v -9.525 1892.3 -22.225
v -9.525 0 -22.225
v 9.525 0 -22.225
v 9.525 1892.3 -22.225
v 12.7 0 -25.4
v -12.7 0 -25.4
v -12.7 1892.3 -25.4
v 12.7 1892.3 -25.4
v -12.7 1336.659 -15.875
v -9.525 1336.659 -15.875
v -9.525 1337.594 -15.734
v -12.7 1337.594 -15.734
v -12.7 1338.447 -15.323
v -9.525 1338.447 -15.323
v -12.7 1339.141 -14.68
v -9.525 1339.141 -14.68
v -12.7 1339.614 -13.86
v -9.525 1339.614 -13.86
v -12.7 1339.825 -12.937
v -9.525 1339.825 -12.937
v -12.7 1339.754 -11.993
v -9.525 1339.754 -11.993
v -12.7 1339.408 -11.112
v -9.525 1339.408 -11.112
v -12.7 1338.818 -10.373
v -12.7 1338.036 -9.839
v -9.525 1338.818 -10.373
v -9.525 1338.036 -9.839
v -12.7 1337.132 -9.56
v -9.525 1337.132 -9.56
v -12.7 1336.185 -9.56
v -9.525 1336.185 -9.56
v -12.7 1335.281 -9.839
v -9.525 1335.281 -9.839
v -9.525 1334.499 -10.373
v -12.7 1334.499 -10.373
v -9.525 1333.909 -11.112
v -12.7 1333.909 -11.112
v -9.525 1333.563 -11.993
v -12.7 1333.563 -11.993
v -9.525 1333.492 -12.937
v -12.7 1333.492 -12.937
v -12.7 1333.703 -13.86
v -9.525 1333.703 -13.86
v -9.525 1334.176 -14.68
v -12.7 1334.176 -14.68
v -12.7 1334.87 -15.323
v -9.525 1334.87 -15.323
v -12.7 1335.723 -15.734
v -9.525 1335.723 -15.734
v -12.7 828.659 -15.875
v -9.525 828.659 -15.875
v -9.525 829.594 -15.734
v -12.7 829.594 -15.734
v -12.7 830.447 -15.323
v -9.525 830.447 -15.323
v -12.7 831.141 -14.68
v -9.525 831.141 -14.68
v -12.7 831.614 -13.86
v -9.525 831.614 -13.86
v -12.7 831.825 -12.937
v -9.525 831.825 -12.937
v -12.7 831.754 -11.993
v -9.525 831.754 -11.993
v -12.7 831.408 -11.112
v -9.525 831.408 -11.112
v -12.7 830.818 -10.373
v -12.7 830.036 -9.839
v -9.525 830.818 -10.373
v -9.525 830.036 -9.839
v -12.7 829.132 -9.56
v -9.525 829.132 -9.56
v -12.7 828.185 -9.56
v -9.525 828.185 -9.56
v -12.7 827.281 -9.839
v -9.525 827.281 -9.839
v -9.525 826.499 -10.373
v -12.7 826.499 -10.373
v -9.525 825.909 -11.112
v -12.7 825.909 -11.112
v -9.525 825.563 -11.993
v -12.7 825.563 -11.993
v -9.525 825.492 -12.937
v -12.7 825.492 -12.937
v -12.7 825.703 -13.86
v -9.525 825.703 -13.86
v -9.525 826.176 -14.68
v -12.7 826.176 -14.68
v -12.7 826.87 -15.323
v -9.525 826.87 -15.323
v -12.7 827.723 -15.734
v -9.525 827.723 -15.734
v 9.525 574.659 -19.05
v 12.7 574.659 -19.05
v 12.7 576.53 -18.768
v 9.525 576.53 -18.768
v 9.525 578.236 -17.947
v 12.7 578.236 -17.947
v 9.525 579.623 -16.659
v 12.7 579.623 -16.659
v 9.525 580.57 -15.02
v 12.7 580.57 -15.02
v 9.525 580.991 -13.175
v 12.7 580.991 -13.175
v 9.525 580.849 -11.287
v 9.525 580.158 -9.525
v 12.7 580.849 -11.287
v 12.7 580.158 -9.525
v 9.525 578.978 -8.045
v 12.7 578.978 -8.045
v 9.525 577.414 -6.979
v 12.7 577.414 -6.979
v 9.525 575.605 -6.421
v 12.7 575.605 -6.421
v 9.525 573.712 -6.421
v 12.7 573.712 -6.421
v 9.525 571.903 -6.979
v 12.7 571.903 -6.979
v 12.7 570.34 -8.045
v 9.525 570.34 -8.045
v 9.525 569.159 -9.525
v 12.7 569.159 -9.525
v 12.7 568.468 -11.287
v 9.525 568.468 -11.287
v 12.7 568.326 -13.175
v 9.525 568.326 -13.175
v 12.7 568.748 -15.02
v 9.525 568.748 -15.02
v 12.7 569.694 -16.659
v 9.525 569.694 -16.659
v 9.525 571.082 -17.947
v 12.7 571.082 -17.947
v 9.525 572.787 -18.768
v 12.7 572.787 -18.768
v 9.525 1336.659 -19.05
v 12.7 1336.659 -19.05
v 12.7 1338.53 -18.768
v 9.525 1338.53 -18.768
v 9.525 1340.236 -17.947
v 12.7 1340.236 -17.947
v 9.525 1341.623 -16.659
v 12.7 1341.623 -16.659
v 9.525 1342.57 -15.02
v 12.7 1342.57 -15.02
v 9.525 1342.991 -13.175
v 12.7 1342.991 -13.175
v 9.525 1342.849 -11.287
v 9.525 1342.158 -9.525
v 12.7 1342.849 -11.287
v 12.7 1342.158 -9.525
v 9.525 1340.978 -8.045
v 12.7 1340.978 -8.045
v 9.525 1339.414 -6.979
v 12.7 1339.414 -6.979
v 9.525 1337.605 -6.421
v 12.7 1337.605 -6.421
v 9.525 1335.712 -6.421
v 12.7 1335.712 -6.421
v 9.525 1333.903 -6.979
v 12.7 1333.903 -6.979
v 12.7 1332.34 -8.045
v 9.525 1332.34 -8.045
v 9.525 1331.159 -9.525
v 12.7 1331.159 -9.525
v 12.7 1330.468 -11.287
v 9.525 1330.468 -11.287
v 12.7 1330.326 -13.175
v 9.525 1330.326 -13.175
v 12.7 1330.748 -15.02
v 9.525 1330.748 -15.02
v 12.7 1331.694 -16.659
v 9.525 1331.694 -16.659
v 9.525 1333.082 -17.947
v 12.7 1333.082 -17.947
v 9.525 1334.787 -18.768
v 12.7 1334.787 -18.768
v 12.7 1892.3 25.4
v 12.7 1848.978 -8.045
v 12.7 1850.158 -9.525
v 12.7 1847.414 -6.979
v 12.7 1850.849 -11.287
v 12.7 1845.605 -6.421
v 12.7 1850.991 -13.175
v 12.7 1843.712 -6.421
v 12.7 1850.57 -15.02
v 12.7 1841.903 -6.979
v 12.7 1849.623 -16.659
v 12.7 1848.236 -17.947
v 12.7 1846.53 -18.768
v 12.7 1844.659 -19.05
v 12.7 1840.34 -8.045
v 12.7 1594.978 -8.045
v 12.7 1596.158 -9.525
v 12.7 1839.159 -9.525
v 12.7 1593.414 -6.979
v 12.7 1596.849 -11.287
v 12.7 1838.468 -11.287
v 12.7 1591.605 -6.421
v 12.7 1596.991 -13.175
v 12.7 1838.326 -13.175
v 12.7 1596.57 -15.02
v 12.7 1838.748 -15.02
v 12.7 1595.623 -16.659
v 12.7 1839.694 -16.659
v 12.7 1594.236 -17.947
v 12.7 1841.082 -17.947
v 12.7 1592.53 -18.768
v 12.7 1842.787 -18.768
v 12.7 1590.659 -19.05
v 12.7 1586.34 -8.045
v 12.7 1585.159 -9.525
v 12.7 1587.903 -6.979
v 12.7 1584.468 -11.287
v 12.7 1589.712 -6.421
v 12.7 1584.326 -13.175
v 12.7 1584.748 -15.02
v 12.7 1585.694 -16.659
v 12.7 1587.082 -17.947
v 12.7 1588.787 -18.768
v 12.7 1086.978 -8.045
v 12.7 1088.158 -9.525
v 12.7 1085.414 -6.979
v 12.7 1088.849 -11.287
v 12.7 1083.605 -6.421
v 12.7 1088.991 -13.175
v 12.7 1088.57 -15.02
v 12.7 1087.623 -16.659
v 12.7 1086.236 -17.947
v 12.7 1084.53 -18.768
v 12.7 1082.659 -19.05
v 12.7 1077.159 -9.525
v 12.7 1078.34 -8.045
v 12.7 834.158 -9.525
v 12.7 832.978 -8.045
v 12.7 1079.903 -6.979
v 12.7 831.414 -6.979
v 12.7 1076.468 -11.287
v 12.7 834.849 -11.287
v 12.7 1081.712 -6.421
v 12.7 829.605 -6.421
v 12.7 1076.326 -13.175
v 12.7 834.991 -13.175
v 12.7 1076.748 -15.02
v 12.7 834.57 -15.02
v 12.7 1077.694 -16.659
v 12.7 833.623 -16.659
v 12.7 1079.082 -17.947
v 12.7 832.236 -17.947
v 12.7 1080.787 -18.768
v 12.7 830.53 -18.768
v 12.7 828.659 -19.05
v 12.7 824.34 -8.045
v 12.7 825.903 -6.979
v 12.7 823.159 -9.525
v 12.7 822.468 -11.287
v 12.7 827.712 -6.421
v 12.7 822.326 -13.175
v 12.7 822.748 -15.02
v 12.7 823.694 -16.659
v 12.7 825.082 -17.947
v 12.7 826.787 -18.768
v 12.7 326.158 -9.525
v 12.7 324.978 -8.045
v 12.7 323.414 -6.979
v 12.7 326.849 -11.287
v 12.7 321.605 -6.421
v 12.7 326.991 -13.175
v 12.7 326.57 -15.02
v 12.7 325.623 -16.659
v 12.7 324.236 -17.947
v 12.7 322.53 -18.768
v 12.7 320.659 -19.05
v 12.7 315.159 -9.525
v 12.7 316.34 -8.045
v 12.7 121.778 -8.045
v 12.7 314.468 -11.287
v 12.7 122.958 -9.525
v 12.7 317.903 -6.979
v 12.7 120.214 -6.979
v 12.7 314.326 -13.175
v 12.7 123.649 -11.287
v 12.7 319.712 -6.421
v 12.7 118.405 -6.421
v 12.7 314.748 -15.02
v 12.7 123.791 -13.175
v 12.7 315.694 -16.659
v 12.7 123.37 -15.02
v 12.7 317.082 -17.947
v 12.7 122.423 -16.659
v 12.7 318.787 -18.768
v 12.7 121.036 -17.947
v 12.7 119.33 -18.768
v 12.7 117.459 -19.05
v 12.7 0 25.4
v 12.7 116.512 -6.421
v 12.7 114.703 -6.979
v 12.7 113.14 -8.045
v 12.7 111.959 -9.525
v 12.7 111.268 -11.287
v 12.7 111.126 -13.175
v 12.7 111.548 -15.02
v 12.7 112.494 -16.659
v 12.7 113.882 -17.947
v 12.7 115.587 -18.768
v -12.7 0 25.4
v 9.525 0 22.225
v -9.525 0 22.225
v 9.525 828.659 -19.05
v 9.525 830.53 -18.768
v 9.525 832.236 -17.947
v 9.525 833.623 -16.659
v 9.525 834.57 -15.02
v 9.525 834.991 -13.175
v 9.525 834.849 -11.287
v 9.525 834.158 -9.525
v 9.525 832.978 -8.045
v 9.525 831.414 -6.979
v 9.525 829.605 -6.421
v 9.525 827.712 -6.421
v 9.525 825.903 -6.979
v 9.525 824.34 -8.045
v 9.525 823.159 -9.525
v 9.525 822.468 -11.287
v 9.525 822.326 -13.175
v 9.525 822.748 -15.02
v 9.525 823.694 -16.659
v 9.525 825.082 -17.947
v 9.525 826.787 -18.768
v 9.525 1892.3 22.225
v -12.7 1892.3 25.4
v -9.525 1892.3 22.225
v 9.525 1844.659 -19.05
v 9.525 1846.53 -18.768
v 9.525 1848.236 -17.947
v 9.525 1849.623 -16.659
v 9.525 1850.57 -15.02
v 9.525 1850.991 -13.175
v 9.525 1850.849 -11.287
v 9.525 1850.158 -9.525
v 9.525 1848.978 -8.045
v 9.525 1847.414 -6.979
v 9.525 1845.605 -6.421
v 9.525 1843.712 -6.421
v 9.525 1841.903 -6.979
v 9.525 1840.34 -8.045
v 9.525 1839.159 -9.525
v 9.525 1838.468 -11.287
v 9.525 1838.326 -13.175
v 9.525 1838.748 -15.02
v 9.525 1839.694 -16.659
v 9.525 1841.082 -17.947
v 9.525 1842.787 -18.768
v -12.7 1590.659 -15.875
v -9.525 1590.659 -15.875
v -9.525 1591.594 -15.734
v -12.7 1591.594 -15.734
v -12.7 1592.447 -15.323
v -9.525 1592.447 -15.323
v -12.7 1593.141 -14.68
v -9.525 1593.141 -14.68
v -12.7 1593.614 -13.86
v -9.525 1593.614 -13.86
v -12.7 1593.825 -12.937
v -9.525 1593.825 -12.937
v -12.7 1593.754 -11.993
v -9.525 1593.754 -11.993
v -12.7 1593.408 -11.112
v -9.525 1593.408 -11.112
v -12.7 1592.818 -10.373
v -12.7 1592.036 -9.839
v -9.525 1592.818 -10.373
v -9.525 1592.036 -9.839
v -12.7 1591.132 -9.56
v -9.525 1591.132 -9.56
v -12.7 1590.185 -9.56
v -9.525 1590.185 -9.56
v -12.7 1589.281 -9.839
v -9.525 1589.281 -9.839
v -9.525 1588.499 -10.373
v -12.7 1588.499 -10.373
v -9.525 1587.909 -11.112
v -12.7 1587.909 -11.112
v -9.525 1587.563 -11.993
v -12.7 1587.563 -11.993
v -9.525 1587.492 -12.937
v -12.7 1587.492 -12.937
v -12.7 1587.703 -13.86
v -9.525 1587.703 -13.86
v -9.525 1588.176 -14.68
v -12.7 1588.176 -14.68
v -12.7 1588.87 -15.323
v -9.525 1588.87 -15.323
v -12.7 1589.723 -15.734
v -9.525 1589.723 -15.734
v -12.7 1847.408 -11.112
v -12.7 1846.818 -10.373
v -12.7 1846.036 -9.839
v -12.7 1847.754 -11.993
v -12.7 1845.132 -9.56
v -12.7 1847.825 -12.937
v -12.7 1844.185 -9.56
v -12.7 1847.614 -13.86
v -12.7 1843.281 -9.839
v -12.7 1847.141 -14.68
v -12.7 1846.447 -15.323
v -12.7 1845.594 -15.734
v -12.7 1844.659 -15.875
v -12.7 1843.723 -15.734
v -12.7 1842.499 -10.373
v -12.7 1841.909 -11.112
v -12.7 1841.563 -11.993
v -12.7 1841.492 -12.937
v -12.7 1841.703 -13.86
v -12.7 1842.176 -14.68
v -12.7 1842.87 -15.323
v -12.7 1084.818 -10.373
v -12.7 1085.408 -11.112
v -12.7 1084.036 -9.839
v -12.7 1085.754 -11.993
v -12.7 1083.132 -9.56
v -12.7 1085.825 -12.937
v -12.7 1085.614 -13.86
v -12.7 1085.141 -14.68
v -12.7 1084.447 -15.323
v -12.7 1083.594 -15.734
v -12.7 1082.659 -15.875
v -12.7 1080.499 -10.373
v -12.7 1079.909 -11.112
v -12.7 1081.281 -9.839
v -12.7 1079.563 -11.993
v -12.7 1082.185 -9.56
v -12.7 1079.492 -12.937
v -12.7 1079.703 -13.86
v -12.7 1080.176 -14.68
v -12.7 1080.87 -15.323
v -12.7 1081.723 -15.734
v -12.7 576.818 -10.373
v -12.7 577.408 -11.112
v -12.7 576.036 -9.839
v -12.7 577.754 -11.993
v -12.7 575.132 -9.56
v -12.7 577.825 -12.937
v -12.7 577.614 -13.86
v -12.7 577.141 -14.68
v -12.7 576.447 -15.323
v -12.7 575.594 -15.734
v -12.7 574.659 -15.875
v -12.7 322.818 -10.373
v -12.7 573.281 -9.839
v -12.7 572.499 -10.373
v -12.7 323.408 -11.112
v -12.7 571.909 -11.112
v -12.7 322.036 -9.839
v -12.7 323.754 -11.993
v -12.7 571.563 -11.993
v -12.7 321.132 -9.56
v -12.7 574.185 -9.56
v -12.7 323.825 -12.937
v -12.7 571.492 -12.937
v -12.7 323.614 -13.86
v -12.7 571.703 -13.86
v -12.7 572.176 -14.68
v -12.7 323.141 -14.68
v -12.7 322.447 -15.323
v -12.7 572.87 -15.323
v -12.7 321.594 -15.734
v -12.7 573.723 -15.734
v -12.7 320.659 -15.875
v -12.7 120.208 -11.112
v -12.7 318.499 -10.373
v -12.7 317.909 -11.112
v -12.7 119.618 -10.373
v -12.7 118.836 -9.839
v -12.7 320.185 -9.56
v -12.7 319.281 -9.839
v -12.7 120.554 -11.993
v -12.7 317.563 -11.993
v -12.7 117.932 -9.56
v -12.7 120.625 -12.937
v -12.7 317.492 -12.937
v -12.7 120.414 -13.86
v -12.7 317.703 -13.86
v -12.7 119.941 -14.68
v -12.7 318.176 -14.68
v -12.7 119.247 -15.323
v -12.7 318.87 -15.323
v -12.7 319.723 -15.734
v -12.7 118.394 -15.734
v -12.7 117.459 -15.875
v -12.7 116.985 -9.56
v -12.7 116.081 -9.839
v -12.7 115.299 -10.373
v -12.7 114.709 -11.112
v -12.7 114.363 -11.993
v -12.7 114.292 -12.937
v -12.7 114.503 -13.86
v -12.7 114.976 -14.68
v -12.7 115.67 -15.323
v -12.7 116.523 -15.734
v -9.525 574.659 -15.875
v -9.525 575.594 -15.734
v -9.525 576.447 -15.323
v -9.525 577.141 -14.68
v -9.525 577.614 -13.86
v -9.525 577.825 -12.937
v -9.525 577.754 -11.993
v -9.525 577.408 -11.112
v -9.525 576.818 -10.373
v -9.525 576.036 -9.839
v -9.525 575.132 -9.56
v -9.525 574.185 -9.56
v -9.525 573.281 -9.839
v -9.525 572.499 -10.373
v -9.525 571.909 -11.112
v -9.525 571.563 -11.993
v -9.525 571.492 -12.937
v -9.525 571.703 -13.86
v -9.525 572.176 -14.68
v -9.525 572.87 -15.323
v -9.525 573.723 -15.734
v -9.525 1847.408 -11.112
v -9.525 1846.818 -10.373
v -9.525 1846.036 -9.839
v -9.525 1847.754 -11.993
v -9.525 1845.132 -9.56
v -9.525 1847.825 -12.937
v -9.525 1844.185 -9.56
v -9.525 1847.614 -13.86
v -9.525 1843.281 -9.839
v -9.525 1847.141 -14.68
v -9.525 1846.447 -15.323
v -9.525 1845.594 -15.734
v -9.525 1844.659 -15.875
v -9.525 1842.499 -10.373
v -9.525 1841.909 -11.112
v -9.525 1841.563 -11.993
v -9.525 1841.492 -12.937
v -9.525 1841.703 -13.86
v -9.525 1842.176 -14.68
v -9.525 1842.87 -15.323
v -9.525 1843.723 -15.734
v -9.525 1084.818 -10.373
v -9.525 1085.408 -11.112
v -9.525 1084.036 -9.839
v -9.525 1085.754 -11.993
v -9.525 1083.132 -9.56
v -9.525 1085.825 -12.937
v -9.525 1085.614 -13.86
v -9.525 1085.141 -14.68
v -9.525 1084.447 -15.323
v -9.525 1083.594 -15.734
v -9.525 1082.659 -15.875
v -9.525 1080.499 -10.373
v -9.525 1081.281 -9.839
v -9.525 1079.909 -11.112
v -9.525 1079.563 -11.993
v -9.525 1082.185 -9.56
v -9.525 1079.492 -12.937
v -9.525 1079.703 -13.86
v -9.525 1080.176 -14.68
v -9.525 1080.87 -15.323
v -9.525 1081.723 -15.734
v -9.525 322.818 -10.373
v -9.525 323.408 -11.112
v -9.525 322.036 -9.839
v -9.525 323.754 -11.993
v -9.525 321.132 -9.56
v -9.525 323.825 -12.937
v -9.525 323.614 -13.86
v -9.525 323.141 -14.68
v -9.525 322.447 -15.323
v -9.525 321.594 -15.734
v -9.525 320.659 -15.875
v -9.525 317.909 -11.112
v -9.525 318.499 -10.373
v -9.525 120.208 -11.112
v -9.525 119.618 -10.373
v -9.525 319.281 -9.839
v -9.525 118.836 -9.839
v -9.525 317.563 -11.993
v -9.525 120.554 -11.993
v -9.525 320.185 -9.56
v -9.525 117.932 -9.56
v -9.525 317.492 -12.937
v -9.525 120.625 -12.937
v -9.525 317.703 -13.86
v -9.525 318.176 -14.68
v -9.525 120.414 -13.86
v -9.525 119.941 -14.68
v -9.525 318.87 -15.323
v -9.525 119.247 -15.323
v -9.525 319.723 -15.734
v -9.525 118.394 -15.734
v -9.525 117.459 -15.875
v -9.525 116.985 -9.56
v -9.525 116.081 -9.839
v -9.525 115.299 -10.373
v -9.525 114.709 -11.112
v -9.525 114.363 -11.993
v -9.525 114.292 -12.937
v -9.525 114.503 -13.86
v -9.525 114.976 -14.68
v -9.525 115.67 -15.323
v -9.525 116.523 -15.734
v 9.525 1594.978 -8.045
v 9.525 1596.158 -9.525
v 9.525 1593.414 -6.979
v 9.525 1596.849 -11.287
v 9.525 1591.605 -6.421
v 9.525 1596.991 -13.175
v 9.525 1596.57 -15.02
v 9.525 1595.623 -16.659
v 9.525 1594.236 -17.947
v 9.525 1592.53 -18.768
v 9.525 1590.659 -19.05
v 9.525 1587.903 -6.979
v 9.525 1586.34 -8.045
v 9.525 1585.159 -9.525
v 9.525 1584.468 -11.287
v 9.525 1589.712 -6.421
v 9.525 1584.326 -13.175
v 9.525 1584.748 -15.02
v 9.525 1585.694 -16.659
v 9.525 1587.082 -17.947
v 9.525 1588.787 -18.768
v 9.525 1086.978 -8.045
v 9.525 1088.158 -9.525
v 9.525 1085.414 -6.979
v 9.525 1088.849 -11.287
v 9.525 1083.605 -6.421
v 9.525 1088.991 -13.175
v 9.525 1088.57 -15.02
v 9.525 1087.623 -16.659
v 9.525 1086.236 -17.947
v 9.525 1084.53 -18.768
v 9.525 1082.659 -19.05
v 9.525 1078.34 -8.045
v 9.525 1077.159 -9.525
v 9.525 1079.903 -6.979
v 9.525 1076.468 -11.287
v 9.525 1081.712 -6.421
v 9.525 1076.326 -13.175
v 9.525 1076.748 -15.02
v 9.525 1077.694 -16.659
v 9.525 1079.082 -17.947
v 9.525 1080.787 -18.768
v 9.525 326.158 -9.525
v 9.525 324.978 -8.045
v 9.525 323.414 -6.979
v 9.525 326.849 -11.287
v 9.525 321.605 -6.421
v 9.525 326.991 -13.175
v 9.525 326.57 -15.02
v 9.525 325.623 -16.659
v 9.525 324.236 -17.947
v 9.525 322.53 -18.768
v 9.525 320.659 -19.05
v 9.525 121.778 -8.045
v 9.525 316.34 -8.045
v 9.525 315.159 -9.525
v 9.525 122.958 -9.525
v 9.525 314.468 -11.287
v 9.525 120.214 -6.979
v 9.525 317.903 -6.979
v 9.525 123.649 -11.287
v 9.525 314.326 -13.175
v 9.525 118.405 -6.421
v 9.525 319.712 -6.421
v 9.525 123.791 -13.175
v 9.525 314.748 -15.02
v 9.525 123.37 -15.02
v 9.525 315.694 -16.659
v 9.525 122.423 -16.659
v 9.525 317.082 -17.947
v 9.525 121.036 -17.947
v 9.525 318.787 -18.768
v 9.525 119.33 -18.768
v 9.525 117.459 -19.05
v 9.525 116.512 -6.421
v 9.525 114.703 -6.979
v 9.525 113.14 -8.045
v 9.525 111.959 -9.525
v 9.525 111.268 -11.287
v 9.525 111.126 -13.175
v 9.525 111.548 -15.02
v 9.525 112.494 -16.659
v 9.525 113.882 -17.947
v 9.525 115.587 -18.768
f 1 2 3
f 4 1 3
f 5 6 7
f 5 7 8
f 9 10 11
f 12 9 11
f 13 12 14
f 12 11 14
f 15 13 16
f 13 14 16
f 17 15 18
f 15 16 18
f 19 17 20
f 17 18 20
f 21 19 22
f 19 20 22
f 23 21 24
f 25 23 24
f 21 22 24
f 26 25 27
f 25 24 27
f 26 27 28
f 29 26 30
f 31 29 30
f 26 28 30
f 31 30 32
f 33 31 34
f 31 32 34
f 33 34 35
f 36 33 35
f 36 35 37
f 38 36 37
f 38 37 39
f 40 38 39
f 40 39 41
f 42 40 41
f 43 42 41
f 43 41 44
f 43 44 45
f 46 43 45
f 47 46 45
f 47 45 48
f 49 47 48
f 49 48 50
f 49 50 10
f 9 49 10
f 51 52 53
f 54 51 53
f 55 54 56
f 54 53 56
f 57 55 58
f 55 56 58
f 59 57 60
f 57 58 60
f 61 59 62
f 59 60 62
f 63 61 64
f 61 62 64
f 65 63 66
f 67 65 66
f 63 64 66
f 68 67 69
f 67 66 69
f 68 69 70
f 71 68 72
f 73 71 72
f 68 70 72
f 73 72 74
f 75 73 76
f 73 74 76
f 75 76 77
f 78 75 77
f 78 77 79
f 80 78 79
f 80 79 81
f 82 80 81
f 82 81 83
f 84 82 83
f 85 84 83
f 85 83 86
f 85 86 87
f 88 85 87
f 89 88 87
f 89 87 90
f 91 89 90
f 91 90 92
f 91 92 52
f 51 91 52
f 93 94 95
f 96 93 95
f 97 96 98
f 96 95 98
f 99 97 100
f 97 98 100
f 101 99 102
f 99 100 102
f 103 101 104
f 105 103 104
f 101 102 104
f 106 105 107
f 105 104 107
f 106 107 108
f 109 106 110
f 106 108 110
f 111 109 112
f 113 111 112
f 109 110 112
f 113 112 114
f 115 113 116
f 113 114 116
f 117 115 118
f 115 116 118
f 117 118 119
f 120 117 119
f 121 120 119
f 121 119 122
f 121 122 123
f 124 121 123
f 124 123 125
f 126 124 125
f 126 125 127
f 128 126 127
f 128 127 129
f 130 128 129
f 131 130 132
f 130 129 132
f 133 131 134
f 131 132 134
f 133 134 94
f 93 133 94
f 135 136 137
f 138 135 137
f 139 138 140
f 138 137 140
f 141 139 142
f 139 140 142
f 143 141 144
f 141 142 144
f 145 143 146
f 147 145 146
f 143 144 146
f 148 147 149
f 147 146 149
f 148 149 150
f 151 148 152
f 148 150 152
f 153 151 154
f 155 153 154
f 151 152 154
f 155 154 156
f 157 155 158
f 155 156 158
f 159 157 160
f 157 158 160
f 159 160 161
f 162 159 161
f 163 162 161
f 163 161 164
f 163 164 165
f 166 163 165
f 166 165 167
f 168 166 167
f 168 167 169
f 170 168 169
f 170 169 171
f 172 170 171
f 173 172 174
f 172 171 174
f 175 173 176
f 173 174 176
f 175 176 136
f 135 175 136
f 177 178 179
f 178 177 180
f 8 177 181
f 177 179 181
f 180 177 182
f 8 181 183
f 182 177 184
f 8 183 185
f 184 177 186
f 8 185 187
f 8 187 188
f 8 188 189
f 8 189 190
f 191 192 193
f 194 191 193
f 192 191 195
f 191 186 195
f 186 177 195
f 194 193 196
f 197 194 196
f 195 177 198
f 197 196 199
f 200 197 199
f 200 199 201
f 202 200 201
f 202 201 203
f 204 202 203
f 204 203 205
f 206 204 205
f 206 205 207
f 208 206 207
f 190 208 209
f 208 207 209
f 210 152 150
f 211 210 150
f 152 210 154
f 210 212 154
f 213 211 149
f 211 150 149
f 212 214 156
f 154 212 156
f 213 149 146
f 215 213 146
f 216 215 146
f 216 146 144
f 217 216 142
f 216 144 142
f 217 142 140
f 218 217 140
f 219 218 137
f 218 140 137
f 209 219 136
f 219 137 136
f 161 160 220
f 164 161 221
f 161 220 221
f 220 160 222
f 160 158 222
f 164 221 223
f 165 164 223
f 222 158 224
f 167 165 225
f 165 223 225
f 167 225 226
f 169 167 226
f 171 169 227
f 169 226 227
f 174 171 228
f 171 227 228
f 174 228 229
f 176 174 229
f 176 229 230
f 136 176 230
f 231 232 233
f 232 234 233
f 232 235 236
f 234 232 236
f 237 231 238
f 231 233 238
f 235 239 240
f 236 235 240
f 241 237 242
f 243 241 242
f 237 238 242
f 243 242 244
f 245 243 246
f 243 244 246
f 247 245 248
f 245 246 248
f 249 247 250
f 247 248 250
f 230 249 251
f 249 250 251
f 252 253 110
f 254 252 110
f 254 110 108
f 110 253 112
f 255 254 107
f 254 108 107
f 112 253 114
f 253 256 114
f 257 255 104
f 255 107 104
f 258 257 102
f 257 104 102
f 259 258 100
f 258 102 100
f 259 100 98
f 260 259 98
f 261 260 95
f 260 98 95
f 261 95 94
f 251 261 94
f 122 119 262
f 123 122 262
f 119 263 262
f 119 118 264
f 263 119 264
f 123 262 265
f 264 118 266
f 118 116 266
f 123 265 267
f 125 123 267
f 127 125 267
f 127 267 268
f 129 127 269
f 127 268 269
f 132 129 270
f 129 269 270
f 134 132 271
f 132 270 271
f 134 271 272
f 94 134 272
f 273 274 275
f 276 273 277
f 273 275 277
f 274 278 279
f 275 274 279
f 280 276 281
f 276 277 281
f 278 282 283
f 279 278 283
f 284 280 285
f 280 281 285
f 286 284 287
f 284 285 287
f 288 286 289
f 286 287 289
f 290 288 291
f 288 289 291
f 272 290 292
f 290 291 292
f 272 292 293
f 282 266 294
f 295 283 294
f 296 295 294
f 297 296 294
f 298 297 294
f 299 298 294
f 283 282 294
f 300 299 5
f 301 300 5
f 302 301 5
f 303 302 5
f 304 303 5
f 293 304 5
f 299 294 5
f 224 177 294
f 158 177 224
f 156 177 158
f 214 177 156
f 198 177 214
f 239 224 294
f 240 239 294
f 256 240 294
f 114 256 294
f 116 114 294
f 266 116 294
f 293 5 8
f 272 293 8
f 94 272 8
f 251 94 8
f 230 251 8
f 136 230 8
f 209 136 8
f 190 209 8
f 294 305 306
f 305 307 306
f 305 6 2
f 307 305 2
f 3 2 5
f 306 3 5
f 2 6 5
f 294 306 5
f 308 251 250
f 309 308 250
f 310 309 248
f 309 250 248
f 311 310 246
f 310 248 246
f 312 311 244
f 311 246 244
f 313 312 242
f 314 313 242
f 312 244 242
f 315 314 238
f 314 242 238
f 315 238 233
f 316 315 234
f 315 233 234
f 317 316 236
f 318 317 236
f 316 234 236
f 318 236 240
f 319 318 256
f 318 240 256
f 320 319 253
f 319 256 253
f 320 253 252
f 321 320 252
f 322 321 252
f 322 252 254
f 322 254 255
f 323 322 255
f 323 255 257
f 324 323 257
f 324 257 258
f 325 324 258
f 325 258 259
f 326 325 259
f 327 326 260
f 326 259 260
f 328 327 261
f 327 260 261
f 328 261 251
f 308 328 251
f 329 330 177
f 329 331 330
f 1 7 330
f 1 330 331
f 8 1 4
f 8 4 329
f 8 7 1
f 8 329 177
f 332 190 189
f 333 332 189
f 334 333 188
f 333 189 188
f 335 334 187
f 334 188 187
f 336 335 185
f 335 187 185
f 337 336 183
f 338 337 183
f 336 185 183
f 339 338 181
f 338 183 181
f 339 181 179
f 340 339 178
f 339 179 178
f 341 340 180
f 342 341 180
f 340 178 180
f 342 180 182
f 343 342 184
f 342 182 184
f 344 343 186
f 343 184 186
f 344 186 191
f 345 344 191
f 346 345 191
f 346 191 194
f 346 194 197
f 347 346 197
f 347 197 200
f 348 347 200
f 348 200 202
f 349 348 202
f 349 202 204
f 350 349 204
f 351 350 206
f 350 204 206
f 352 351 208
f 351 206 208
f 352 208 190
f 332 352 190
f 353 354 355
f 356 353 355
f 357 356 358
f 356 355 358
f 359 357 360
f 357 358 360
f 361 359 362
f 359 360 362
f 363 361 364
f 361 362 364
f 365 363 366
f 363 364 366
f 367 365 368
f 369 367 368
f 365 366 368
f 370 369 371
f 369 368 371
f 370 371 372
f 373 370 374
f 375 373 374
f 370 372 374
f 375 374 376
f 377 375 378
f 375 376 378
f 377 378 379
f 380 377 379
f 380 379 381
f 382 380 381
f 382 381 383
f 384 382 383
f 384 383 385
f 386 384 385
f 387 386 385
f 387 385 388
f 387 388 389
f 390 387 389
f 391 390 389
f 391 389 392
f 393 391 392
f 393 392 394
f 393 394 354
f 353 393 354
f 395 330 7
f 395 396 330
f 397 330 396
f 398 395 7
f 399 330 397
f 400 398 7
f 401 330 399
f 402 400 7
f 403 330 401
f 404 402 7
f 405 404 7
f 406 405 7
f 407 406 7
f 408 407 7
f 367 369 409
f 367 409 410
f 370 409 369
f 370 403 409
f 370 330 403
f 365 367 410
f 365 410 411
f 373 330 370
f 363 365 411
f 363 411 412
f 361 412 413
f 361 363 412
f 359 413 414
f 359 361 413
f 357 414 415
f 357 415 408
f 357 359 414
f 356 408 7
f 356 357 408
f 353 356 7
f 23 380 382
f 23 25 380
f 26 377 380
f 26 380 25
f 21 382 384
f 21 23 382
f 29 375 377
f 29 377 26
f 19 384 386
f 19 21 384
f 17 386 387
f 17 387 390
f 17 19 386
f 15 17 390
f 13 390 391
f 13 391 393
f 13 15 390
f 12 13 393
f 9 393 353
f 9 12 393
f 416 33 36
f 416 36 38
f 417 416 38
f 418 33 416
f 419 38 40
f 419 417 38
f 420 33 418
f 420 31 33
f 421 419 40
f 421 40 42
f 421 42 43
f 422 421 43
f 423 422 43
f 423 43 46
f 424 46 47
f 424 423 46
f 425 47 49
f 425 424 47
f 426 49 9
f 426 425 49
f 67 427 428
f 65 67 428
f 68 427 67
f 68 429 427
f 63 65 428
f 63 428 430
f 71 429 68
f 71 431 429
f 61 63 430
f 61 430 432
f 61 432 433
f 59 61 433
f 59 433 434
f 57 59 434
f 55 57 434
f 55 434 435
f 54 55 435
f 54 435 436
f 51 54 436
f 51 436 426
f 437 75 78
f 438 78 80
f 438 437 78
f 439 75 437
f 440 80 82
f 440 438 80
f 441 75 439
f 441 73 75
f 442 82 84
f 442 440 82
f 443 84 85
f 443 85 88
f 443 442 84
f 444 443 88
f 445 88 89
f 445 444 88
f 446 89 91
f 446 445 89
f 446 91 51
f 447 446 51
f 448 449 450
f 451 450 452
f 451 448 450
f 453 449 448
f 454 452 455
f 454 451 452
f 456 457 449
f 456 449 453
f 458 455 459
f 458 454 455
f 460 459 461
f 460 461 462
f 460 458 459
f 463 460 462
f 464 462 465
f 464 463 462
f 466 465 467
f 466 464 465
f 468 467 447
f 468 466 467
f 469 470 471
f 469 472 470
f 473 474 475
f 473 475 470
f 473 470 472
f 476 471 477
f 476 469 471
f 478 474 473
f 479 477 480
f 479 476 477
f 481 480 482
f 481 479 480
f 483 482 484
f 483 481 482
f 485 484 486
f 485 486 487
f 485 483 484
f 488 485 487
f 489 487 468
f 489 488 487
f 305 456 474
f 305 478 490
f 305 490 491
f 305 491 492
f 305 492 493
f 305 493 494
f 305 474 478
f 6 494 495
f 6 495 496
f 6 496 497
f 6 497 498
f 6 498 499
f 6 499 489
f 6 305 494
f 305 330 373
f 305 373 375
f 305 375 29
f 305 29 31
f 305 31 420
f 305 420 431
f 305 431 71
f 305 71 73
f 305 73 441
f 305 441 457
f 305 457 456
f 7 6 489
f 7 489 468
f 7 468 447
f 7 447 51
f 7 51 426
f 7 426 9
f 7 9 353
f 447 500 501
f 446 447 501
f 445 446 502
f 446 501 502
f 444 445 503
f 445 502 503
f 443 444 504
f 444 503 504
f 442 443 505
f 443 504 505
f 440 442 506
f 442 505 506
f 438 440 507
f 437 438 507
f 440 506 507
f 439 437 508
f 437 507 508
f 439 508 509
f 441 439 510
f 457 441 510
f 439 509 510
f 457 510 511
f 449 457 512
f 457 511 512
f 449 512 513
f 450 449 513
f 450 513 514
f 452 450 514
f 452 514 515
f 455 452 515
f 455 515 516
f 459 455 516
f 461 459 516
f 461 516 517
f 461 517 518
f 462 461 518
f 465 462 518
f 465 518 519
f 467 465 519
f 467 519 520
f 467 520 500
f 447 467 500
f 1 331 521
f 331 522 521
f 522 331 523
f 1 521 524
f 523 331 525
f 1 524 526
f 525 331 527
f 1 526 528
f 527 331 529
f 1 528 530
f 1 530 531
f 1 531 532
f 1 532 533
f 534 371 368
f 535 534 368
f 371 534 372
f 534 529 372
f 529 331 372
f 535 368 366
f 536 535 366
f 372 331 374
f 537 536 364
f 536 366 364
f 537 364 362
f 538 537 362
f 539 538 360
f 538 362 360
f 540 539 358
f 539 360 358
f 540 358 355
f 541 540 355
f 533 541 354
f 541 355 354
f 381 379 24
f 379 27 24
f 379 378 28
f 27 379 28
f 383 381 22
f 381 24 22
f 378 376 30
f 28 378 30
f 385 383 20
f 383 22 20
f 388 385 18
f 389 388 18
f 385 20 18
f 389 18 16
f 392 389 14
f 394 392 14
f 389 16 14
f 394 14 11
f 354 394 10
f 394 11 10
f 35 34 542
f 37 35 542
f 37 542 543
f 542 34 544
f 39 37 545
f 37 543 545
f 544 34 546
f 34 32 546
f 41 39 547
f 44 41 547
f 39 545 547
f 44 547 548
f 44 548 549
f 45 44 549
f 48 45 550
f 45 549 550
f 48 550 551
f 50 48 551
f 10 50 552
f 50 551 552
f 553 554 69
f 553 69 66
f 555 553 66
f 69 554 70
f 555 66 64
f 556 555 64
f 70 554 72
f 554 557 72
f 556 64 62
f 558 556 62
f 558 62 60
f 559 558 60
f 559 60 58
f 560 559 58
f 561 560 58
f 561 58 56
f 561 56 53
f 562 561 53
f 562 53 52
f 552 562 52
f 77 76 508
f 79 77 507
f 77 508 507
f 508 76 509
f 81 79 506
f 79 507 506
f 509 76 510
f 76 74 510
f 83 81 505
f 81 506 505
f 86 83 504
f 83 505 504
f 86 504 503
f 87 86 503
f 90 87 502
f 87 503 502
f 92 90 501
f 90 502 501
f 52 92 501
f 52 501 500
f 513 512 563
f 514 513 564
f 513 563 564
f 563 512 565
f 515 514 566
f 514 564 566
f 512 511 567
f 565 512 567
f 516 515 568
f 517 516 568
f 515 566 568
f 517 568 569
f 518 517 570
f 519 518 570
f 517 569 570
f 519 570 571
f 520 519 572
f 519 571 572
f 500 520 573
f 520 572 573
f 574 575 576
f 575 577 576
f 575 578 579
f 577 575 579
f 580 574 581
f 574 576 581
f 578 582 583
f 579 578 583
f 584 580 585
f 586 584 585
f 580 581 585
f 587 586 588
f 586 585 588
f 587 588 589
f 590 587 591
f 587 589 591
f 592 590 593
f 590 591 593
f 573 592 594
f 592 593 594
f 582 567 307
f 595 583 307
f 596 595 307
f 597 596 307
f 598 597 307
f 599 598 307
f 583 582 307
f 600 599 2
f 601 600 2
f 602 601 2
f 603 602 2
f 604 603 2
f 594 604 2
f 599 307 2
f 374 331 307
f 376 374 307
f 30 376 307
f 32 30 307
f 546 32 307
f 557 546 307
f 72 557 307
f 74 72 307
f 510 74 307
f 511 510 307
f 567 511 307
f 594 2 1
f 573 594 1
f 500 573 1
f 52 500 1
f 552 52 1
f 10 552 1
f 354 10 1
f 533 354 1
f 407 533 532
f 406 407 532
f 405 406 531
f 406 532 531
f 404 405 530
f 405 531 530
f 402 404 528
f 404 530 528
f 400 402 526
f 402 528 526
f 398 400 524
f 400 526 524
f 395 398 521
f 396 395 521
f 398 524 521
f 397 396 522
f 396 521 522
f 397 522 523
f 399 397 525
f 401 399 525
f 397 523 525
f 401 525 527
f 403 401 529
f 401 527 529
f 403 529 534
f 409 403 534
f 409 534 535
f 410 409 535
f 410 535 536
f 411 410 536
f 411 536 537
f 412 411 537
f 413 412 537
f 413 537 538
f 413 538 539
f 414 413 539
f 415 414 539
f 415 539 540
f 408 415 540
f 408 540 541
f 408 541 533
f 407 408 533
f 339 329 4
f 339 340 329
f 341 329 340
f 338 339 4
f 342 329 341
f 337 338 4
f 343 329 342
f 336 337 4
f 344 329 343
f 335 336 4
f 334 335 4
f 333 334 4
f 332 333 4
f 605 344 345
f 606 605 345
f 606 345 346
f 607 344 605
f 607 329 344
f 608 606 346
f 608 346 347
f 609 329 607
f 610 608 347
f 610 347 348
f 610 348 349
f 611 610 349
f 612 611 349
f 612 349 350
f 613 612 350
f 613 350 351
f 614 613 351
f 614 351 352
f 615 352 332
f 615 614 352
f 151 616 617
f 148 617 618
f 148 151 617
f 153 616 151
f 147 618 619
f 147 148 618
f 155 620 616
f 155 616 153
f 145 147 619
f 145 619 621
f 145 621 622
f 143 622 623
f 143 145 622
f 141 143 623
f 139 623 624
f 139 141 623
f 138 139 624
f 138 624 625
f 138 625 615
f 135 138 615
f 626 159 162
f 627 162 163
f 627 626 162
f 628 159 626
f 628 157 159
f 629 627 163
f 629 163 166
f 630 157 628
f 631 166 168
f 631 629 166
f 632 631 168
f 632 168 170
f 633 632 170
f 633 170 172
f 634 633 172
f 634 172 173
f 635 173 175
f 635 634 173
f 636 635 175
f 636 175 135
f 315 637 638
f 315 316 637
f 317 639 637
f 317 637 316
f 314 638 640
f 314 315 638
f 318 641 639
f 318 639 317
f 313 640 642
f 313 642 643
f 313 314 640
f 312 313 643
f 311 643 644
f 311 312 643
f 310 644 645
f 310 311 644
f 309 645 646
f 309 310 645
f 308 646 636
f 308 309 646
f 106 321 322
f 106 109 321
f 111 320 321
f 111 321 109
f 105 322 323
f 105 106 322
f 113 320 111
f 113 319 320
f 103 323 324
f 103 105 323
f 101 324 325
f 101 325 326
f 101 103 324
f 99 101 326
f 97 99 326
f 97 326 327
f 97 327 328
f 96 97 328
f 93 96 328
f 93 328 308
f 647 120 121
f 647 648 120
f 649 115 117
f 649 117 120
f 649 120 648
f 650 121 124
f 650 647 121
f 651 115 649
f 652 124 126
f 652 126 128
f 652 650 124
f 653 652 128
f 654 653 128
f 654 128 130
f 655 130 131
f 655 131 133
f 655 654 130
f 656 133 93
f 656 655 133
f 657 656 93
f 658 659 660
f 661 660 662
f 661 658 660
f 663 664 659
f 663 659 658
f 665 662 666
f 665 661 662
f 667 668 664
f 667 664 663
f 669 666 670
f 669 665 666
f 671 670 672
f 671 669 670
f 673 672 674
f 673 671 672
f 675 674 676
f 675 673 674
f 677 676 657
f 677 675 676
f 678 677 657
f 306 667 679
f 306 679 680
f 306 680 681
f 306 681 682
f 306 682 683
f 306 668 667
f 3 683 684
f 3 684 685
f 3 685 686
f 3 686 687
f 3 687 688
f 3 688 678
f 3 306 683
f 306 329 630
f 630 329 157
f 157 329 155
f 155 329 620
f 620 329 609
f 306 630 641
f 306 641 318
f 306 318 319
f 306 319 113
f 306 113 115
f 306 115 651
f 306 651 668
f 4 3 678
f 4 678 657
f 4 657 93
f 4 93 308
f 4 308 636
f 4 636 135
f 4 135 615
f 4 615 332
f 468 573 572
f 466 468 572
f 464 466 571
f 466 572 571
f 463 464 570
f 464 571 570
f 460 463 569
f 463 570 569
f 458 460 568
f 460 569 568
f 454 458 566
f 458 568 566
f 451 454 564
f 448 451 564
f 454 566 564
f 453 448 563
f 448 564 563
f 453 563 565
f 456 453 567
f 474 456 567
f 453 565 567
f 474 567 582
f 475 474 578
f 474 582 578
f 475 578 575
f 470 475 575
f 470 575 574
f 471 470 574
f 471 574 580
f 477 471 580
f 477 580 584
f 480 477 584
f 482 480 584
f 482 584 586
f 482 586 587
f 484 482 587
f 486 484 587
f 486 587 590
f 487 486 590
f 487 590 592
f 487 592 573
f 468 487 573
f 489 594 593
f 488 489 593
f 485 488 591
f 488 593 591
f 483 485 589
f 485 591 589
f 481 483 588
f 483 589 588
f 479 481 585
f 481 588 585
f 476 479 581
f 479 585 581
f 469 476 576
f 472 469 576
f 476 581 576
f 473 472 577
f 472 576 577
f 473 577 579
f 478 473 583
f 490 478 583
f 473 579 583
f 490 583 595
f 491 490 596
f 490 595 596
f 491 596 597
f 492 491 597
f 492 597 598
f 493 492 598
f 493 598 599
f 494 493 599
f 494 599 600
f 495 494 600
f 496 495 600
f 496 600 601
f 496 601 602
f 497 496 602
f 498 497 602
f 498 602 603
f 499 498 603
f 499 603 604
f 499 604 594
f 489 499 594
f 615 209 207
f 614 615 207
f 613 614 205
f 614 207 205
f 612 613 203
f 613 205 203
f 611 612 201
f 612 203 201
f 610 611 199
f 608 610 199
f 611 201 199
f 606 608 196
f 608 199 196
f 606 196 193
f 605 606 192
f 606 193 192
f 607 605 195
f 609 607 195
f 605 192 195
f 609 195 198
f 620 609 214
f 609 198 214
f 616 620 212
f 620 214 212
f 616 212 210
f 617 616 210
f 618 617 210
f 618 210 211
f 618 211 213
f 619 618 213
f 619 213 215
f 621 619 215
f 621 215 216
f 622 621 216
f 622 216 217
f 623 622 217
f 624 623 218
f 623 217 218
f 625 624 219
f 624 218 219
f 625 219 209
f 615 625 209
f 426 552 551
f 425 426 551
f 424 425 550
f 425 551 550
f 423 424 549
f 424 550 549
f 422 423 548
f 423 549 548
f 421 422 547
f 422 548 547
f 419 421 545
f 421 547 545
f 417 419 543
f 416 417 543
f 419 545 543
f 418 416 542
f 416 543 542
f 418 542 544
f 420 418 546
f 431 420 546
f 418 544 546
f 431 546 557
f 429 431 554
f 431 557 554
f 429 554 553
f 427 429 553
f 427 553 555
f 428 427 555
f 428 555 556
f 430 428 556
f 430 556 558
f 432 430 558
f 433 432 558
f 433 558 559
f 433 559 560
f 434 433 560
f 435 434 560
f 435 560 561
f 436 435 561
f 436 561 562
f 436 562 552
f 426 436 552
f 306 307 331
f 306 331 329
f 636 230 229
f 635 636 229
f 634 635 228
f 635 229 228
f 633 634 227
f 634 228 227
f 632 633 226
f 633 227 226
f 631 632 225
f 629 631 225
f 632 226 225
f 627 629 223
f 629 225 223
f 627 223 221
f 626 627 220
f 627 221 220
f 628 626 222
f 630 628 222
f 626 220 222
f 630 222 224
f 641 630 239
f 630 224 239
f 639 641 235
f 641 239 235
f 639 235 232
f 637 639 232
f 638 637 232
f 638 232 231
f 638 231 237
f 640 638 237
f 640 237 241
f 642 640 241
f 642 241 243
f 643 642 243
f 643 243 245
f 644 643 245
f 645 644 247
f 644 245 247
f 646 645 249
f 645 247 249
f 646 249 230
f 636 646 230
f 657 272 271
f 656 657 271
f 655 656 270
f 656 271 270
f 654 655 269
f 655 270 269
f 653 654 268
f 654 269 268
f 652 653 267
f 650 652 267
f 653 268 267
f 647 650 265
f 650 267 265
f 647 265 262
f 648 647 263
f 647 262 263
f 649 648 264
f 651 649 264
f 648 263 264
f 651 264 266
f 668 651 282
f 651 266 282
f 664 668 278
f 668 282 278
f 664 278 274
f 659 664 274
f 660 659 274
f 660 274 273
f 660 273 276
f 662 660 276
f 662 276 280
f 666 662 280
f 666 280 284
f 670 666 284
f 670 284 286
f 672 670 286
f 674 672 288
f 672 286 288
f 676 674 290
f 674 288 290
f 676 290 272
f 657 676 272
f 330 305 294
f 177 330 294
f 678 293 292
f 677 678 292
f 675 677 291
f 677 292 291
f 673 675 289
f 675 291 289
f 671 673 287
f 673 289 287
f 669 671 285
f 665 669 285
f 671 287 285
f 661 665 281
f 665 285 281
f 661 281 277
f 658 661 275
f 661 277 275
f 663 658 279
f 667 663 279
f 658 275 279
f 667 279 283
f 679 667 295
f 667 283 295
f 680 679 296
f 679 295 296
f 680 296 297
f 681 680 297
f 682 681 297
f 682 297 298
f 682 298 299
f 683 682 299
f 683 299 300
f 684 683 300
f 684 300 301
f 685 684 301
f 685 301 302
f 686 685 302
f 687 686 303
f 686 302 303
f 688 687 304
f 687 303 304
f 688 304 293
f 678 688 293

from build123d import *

# Parameters (mm, degrees)
SKETCH1_W           = 25.4
SKETCH1_H           = 50.8
SKETCH1_W_2         = 19.05
SKETCH1_H_2         = 44.45
BOSS_EXTRUDE2_DEPTH = 1892.3
SKETCH2_R           = 3.175
CUT_EXTRUDE1_DEPTH  = 25.4
SKETCH3_R           = 3.175
CUT_EXTRUDE2_DEPTH  = 25.4
SKETCH4_R           = 6.35
CUT_EXTRUDE3_DEPTH  = 3.175
SKETCH5_R           = 6.35
CUT_EXTRUDE4_DEPTH  = 3.175


with BuildPart() as part:
    # Sketch1 → Boss-Extrude2 (new body)
    with BuildSketch(Plane(origin=(0, 0, 0), x_dir=(1, 0, 0), z_dir=(0, 1, 0))):
        Rectangle(SKETCH1_W, SKETCH1_H)
        Rectangle(SKETCH1_W_2, SKETCH1_H_2, mode=Mode.SUBTRACT)
    extrude(amount=BOSS_EXTRUDE2_DEPTH)

    # Sketch2 → Cut-Extrude1 (cut)
    with BuildSketch(Plane(origin=(12.7, 0, 0), x_dir=(0, 0, -1), z_dir=(1, 0, 0))):
        with Locations((12.7, 1844.658598875)):
            Circle(SKETCH2_R)
        with Locations((12.7, 1590.658598875)):
            Circle(SKETCH2_R)
        with Locations((12.7, 1336.658598875)):
            Circle(SKETCH2_R)
        with Locations((12.7, 1082.658598875)):
            Circle(SKETCH2_R)
        with Locations((12.7, 828.658598875)):
            Circle(SKETCH2_R)
        with Locations((12.7, 574.658598875)):
            Circle(SKETCH2_R)
        with Locations((12.7, 320.658598875)):
            Circle(SKETCH2_R)
    extrude(amount=-CUT_EXTRUDE1_DEPTH, mode=Mode.SUBTRACT)

    # Sketch3 → Cut-Extrude2 (cut)
    with BuildSketch(Plane(origin=(12.7, 0, 0), x_dir=(0, 0, -1), z_dir=(1, 0, 0))):
        with Locations((12.7, 117.458598875)):
            Circle(SKETCH3_R)
    extrude(amount=-CUT_EXTRUDE2_DEPTH, mode=Mode.SUBTRACT)

    # Sketch4 → Cut-Extrude3 (cut)
    with BuildSketch(Plane(origin=(12.7, 0, 0), x_dir=(0, 0, -1), z_dir=(1, 0, 0))):
        with Locations((12.7, 1844.658598875)):
            Circle(SKETCH4_R)
        with Locations((12.7, 1590.658598875)):
            Circle(SKETCH4_R)
        with Locations((12.7, 1336.658598875)):
            Circle(SKETCH4_R)
        with Locations((12.699999999, 1082.658598875)):
            Circle(SKETCH4_R)
        with Locations((12.699999999, 828.658598875)):
            Circle(SKETCH4_R)
        with Locations((12.699999999, 574.658598875)):
            Circle(SKETCH4_R)
        with Locations((12.699999999, 320.658598875)):
            Circle(SKETCH4_R)
    extrude(amount=-CUT_EXTRUDE3_DEPTH, mode=Mode.SUBTRACT)

    # Sketch5 → Cut-Extrude4 (cut)
    with BuildSketch(Plane(origin=(12.7, 0, 0), x_dir=(0, 0, -1), z_dir=(1, 0, 0))):
        with Locations((12.7, 117.458598875)):
            Circle(SKETCH5_R)
    extrude(amount=-CUT_EXTRUDE4_DEPTH, mode=Mode.SUBTRACT)


solid = part.part
